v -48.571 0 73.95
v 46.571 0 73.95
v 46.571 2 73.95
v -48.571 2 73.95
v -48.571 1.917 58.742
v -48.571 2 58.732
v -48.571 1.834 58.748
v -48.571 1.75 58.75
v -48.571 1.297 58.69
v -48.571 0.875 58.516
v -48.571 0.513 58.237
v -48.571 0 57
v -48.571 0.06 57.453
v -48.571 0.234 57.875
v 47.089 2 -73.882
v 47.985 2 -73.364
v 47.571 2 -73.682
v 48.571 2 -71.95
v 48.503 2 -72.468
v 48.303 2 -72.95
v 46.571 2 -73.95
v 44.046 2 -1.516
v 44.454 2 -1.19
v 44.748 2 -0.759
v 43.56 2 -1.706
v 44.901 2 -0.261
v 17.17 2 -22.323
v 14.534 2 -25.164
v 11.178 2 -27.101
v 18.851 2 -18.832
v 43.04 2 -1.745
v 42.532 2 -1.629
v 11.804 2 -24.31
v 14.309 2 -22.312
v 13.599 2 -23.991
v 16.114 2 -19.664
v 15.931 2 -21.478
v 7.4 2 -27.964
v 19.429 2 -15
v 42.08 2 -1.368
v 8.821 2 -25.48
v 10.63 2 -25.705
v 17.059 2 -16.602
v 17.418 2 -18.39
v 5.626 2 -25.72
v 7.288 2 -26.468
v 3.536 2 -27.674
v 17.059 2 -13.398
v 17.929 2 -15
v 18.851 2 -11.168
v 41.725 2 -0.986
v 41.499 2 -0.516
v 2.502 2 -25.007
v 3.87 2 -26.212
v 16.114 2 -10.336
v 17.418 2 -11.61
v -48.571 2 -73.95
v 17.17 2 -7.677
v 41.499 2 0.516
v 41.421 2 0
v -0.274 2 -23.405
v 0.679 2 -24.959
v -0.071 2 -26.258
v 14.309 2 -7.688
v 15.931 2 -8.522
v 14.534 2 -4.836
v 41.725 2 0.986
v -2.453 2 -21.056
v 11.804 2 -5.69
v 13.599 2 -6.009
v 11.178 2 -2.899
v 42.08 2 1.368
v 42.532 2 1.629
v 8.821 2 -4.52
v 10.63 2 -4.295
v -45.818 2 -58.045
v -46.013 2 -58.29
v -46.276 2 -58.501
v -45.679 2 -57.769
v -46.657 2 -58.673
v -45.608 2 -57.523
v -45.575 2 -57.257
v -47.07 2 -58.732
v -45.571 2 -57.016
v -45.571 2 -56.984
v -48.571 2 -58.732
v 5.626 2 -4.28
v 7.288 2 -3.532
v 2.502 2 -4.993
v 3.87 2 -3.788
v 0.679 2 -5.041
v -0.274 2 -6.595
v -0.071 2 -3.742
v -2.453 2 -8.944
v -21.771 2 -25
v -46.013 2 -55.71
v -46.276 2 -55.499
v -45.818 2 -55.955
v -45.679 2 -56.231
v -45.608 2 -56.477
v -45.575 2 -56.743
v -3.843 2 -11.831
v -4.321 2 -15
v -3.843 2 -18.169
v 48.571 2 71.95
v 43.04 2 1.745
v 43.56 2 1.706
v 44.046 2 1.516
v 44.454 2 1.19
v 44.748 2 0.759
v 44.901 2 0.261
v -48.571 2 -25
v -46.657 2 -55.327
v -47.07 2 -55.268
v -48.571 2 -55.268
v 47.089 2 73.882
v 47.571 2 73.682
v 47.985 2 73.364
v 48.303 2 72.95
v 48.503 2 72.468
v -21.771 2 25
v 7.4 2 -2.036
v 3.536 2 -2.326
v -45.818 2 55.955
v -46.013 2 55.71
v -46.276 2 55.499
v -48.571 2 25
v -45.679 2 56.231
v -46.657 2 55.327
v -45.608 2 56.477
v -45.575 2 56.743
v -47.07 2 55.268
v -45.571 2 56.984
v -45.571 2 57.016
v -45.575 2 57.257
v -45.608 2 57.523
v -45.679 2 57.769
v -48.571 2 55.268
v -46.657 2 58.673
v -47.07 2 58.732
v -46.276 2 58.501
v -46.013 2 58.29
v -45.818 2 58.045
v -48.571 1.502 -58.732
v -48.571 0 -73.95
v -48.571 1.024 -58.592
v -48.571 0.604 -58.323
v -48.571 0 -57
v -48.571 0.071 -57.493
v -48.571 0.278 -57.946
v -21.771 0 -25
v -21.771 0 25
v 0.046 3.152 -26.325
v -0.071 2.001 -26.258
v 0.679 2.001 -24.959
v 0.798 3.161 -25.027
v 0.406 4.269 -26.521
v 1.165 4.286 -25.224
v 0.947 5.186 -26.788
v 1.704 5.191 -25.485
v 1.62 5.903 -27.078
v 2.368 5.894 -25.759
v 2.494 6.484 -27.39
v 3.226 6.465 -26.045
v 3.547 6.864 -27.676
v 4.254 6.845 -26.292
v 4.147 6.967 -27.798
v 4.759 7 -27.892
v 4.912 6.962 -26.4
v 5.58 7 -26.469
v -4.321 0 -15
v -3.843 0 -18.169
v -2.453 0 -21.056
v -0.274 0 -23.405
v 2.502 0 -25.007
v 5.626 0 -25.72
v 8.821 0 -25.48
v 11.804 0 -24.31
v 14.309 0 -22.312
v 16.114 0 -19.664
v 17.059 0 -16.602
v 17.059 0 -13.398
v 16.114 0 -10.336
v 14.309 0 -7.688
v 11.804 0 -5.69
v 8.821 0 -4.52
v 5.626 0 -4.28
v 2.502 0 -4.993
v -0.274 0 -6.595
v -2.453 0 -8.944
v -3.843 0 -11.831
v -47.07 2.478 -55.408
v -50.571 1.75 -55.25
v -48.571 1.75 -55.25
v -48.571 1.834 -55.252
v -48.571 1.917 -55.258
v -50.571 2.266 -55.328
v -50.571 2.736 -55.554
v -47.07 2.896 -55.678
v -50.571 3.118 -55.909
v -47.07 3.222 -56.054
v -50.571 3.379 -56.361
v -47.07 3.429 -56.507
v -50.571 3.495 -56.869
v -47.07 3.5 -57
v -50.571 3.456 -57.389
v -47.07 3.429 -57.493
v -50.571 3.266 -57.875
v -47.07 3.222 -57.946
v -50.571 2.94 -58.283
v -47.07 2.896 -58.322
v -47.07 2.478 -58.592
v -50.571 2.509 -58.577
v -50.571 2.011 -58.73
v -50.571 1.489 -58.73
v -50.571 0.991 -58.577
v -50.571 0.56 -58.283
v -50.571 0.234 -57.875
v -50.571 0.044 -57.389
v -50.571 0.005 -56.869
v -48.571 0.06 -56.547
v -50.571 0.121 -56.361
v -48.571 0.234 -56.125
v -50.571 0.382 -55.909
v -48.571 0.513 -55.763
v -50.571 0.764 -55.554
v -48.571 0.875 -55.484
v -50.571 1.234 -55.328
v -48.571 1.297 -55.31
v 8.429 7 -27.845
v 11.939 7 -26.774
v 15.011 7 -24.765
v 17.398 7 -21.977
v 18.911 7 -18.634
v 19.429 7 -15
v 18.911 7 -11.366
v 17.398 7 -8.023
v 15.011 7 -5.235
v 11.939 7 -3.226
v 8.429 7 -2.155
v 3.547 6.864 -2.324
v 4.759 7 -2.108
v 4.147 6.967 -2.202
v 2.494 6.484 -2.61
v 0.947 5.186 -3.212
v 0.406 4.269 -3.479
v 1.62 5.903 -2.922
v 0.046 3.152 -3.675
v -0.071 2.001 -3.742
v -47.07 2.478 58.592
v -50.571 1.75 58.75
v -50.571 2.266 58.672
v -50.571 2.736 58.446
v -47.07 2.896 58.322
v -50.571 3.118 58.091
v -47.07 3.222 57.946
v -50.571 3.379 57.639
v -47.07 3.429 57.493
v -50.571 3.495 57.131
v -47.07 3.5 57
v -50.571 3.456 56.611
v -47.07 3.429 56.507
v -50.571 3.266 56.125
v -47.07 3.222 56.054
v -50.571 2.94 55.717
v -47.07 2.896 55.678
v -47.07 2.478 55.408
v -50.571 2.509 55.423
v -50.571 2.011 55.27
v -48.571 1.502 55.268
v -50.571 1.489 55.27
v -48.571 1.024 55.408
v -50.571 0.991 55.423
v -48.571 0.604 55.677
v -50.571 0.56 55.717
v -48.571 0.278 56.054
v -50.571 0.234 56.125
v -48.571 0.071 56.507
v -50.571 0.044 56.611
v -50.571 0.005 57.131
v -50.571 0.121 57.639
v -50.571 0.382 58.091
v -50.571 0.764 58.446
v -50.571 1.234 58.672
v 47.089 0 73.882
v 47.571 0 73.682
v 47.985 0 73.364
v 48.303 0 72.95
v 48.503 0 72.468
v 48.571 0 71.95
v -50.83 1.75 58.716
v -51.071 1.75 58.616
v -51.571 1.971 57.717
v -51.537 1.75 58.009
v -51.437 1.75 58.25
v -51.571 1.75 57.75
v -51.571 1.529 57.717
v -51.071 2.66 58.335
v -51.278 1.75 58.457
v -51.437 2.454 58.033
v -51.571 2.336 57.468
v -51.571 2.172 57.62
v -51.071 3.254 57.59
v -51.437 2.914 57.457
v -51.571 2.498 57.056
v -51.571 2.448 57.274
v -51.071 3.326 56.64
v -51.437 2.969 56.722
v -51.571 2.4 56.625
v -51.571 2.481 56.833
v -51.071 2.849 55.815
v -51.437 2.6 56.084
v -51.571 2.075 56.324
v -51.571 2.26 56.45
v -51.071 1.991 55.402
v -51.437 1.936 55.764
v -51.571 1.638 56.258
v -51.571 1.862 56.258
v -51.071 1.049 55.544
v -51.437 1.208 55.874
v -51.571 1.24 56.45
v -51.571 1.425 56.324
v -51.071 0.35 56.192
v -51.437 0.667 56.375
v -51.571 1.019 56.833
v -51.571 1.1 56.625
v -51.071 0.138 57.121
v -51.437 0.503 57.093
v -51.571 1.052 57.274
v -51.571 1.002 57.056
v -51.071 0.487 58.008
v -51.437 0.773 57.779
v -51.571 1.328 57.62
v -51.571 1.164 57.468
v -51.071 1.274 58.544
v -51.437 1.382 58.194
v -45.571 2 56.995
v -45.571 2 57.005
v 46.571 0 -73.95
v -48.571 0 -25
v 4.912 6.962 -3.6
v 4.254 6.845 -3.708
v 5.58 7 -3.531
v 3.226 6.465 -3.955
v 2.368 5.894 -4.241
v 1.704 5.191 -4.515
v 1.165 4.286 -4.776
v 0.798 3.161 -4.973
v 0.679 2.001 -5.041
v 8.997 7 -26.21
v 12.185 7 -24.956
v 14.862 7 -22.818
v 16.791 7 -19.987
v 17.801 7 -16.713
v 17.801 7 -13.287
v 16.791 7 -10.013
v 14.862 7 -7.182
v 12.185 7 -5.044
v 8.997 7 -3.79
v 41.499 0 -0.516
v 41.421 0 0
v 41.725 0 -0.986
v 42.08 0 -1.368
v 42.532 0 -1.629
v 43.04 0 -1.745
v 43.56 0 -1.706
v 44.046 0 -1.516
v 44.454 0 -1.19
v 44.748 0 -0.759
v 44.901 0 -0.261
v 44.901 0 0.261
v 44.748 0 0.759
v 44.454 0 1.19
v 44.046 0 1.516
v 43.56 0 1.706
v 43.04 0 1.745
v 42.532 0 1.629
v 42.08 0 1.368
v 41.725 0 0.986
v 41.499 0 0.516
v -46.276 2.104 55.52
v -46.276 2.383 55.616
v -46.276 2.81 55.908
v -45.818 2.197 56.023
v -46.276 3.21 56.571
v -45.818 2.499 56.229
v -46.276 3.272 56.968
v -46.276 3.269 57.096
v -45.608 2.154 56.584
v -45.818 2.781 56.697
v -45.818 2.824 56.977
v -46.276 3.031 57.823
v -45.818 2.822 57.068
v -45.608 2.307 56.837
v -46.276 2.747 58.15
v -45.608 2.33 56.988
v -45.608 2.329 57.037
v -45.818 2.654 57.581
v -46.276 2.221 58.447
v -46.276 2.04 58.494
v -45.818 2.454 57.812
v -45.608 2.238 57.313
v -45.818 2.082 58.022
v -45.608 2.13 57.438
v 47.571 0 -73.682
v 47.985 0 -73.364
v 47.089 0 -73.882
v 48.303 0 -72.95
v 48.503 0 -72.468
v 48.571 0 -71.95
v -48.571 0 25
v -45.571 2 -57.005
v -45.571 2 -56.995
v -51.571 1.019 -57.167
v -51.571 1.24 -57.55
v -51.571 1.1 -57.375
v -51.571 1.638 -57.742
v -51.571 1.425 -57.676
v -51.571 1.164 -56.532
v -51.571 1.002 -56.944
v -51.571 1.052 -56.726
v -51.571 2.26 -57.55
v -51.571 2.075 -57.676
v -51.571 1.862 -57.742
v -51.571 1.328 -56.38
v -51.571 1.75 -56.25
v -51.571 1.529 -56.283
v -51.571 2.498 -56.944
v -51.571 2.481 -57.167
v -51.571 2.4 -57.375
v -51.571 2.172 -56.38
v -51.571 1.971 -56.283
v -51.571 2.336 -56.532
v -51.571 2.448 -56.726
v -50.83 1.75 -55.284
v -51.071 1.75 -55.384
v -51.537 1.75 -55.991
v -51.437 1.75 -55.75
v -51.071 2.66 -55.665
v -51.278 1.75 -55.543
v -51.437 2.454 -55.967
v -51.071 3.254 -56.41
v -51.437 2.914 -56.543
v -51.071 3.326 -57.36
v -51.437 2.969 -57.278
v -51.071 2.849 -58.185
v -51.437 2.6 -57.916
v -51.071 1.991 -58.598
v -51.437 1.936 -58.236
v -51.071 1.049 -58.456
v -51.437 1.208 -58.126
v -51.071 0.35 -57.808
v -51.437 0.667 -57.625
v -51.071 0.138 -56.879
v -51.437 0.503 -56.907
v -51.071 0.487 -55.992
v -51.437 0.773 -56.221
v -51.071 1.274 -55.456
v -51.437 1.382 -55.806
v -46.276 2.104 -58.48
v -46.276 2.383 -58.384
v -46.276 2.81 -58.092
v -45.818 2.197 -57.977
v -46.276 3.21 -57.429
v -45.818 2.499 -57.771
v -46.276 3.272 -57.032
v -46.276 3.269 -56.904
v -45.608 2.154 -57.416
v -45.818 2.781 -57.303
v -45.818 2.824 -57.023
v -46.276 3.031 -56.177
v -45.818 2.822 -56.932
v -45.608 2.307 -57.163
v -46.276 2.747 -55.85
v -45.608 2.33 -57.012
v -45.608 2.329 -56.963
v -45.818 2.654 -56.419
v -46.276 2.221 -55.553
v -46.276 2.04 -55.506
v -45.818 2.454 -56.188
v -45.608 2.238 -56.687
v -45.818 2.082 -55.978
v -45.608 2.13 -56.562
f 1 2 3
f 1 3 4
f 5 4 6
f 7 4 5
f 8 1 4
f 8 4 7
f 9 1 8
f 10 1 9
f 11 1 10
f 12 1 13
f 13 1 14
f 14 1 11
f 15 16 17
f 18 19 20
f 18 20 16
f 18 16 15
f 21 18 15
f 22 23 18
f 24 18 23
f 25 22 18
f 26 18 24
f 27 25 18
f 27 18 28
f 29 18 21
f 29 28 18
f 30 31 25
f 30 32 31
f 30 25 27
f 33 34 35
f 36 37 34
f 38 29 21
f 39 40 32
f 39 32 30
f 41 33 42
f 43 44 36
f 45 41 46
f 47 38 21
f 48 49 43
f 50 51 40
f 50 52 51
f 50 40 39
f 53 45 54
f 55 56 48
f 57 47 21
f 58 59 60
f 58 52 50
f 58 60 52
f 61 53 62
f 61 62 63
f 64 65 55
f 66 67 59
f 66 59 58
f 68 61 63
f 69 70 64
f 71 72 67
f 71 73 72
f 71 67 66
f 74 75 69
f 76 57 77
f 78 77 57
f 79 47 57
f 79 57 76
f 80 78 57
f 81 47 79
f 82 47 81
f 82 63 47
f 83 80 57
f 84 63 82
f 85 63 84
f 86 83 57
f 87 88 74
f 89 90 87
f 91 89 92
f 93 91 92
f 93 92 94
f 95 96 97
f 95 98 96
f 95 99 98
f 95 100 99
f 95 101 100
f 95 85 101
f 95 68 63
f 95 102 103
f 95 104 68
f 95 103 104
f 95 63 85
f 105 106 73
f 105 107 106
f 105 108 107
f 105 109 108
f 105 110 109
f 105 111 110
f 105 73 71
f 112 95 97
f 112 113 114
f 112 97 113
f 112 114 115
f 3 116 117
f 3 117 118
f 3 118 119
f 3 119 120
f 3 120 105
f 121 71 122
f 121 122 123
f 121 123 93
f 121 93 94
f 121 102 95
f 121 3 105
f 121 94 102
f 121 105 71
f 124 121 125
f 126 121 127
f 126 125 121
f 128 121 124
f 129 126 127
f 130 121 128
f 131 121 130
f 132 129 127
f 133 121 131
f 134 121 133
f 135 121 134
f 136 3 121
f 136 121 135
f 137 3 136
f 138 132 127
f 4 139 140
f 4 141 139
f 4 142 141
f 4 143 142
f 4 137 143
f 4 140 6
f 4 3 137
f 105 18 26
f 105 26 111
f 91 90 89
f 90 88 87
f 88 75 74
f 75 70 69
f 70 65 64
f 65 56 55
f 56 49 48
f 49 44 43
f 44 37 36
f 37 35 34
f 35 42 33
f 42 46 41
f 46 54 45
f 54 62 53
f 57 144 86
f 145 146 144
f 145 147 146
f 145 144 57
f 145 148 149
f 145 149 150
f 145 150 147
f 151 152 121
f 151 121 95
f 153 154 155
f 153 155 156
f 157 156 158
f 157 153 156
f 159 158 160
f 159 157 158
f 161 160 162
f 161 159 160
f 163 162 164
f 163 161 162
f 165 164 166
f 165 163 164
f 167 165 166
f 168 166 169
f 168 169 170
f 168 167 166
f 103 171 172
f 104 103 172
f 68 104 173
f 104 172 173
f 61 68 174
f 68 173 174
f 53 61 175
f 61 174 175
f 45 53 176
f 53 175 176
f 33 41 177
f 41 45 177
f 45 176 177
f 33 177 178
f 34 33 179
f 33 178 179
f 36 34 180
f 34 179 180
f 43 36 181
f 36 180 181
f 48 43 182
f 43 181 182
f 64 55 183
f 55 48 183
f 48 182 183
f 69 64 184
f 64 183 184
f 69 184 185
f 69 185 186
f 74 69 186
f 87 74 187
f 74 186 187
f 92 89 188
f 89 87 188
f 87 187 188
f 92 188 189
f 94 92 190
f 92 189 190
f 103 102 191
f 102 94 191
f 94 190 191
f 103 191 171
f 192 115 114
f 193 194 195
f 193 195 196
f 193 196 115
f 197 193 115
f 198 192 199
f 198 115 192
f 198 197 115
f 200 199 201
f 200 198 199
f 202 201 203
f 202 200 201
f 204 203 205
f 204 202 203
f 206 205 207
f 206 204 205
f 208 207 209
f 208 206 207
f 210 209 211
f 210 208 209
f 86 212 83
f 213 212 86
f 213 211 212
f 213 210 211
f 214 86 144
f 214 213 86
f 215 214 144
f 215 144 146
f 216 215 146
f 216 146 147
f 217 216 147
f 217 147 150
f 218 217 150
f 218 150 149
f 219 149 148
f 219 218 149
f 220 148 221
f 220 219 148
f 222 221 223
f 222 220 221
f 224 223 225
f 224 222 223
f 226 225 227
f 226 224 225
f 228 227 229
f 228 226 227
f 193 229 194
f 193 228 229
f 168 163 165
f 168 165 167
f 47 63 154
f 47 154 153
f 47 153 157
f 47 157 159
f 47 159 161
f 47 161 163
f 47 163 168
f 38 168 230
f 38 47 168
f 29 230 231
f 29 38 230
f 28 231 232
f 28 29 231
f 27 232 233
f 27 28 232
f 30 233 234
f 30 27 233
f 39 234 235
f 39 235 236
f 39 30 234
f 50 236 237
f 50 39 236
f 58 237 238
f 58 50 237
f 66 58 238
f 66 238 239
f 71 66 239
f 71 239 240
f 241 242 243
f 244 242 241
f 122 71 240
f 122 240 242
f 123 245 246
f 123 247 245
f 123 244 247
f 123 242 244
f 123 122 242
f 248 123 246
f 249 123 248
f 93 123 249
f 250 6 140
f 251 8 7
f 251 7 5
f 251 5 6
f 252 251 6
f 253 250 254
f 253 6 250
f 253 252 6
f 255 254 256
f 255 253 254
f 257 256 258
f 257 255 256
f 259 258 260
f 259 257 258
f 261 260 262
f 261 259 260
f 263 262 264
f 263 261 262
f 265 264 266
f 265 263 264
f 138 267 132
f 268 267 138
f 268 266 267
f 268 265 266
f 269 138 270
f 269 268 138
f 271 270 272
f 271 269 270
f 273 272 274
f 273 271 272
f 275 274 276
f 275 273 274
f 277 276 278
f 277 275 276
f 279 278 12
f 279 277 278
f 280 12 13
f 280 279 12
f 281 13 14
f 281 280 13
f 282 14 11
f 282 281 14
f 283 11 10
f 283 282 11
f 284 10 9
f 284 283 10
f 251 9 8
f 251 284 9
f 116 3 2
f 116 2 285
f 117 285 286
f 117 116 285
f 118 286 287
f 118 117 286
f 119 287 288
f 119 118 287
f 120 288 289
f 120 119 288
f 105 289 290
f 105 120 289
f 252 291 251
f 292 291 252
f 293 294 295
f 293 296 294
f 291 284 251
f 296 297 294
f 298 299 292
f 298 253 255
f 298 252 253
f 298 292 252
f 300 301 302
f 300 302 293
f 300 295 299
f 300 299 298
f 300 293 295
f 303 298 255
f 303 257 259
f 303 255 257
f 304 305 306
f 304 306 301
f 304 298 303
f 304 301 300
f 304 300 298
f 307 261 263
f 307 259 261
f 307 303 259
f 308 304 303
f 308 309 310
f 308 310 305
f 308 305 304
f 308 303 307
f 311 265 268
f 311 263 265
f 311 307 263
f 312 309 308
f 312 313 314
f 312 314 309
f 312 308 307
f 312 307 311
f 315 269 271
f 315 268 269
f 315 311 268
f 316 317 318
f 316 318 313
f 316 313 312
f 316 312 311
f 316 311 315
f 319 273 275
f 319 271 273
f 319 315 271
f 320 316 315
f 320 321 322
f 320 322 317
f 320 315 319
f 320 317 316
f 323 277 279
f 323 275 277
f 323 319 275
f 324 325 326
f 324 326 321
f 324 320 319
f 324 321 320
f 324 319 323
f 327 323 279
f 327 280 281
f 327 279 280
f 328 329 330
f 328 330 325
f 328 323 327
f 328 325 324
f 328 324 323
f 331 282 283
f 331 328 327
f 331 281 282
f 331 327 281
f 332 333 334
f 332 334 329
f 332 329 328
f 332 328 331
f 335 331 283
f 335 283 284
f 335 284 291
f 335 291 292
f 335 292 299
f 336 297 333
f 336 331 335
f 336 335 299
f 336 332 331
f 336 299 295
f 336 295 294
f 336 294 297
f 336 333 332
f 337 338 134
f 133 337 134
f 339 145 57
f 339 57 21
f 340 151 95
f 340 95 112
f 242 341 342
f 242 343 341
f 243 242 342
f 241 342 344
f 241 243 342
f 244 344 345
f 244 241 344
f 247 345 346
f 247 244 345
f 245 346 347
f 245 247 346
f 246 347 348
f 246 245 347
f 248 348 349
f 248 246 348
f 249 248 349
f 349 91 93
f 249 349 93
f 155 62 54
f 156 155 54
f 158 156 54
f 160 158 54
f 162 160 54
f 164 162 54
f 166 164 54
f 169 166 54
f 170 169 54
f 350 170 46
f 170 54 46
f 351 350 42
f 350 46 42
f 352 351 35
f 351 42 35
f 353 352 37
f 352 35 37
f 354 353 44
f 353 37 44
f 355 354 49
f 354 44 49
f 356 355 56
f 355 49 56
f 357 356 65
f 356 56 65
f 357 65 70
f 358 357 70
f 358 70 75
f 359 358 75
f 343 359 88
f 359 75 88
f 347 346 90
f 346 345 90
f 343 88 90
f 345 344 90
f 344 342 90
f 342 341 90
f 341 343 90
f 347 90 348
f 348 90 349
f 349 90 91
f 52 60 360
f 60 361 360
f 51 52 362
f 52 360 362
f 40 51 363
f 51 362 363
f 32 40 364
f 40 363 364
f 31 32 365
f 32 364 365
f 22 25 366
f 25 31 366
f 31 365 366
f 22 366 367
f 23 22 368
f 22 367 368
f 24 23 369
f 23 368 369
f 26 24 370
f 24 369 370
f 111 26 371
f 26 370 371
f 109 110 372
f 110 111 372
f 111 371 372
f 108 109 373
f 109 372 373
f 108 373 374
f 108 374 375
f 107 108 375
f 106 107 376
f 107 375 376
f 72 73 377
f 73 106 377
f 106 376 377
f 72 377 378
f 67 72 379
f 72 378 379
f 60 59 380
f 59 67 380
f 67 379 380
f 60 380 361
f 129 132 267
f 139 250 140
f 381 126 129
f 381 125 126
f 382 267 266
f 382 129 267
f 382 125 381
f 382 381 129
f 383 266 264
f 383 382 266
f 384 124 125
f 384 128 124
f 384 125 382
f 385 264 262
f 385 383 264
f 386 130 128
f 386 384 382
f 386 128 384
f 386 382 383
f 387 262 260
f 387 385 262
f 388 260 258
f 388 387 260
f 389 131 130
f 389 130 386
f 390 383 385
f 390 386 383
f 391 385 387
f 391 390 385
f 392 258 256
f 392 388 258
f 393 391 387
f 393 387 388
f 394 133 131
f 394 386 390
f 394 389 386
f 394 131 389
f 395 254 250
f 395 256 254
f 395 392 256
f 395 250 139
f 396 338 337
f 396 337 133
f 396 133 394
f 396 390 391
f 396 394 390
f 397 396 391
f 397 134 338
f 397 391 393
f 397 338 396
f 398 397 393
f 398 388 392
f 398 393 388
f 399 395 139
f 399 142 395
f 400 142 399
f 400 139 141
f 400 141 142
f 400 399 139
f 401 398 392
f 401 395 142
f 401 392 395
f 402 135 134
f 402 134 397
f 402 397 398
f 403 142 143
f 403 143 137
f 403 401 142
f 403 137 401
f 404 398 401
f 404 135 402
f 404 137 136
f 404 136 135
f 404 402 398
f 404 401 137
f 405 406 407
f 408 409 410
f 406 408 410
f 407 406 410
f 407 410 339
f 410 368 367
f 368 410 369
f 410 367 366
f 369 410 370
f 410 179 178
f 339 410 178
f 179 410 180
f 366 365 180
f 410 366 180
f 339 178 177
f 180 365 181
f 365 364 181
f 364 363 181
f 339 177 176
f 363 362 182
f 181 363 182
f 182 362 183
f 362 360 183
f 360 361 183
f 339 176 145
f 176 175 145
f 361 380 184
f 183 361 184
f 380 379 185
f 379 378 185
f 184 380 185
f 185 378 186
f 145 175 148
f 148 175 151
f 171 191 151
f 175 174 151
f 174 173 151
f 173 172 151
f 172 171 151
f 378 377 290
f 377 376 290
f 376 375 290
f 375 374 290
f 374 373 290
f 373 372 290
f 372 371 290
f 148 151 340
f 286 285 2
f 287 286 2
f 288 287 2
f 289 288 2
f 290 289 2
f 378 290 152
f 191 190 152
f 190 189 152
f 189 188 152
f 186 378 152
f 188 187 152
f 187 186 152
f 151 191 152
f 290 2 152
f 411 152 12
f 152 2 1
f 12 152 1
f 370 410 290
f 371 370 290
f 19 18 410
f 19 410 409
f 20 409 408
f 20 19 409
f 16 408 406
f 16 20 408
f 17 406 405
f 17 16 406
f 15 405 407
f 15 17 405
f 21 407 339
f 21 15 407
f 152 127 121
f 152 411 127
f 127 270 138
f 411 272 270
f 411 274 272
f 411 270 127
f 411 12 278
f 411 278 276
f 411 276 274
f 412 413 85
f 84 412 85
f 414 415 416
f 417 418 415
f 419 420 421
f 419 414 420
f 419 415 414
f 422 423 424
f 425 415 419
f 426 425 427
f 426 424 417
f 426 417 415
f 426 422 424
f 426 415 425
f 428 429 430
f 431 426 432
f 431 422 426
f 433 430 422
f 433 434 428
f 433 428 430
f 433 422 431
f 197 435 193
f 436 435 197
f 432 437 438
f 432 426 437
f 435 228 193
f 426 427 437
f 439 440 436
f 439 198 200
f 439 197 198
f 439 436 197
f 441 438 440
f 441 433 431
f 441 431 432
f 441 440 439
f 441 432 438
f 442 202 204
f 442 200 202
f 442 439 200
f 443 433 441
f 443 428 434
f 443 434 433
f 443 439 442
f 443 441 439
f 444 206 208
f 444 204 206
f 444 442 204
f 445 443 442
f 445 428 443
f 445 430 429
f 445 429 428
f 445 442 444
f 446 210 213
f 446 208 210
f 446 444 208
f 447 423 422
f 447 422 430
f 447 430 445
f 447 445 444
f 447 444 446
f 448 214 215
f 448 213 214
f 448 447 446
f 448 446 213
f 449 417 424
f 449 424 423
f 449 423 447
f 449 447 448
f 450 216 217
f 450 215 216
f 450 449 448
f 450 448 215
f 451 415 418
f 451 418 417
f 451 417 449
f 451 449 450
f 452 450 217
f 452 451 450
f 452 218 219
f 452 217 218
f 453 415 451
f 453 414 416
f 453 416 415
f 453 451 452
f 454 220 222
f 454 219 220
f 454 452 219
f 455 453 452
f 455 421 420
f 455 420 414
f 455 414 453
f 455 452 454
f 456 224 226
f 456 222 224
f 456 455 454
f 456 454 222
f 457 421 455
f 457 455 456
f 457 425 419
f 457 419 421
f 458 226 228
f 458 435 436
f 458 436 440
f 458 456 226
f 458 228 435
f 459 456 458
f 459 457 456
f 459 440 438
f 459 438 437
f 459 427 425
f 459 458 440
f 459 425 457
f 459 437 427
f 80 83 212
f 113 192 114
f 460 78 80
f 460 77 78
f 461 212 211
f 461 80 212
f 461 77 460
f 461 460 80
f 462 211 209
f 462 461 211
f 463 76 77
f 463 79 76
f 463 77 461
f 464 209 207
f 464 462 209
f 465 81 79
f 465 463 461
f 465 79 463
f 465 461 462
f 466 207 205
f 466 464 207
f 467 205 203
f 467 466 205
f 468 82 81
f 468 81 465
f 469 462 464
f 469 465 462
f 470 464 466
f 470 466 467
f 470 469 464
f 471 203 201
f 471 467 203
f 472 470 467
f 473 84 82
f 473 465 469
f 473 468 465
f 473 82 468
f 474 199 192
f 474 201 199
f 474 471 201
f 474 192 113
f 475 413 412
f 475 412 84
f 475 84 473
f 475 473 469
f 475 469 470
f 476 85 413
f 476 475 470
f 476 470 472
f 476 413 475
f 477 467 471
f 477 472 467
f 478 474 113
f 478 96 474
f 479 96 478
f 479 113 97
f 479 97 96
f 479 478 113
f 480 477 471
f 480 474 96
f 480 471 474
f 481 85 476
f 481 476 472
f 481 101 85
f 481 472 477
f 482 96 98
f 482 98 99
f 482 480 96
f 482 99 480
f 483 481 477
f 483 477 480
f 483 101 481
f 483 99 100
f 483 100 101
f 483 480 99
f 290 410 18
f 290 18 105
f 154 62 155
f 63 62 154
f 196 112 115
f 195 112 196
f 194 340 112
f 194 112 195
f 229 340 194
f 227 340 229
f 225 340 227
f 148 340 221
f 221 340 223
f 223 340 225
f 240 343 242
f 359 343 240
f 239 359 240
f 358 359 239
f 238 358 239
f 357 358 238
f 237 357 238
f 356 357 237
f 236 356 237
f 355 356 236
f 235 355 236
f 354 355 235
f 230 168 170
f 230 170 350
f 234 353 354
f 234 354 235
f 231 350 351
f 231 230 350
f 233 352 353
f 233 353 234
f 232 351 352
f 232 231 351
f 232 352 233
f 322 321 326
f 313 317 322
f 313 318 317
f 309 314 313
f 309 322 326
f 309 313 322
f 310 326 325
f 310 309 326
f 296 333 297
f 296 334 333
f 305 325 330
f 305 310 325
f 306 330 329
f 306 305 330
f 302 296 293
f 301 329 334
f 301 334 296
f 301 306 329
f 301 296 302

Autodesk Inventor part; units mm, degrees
ref_plane "YZ Plane" through (0, 0, 0) normal (1, 0, 0) x (0, 1, 0)
ref_plane "XZ Plane" through (0, 0, 0) normal (0, 1, 0) x (-1, 0, 0)
ref_plane "XY Plane" through (0, 0, 0) normal (0, 0, 1) x (1, 0, 0)
sketch "Sketch1" plane through (0, 0, 0) normal (0, 1, 0) x (-1, 0, 0)
  line L0 (-48.571, 73.95) -> (48.571, 73.95)
  line L1 (48.571, 73.95) -> (48.571, -73.95)
  line L2 (48.571, -73.95) -> (-48.571, -73.95)
  line L3 (-48.571, -73.95) -> (-48.571, 73.95)
  line L4 (-48.571, 73.95) -> (48.571, -73.95) construction
  line L5 (48.571, 73.95) -> (-48.571, -73.95) construction
  circle A0 centre (-43.171, 0) radius 1.75
  line L6 (-48.571, -73.95) -> (-48.571, -59.45)
  circle A1 centre (-6.429, -15) radius 10.75
  line L7 (-67.9994, 0) -> (67.9994, 0) construction
  point P0 (0, 0)
  dimension "d0" = 97.142
  dimension "d1" = 147.9
  dimension "d3" = 3.5
  dimension "d54" = 55
  dimension "d61" = 5.4
  dimension "d62" = 15
  dimension "d63" = 21.5
extrude "Lid Shape" add sketch "Sketch1" along normal blind 2
sketch "Sketch2" plane through (0, 2, 0) normal (0, 1, 0) x (1, 0, 0)
  circle A0 centre (6.429, 15) radius 10.75
  circle A1 centre (6.429, 15) radius 11.5
  circle A2 centre (6.429, 15) radius 13
  line L0 (6.429, 15) -> (-0.071, 3.7417)
  line L1 (6.429, 15) -> (19.429, 15) construction
  line L2 (6.429, 15) -> (-0.071, 26.2583)
  circle A3 centre (6.429, 15) radius 10.75 construction
  point P0 (0.679, 24.9593)
  point P1 (0.679, 5.0407)
  dimension "d64" = 26
  dimension "d65" = 23
  dimension "d66" = 120
  dimension "d67" = 120
extrude "Switch Protector" add sketch "Sketch2" along normal blind 5 contours L2 A2 L0 A1 picked at (18.7089, 13.1166)
fillet "Fillet1" radius 5 2 edges at (0.304, 7, -4.3912) (0.304, 7, -25.6088)
fillet "Fillet2" radius 2 2 edges at (48.571, 1, 73.95) (48.571, 1, -73.95)
sketch "Sketch4" plane through (-48.571, 0, -73.95) normal (-1, 0, 0) x (0, 0, 1)
  line L0 (16.95, 0) -> (16.95, 1.75) construction
  circle A0 centre (16.95, 1.75) radius 1.75
  circle A1 centre (73.95, 1.75) radius 1.75
  circle A2 centre (130.95, 1.75) radius 1.75
  line L1 (0, 2) -> (147.9, 2) projected
  line L2 (0, 0) -> (147.9, 0) projected
  line L3 (147.9, 0) -> (147.9, 2) projected
  line L4 (0, 2) -> (147.9, 2) projected
  line L5 (0, 0) -> (0, 2) projected
  line L6 (73.95, 4.2) -> (73.95, -0.7) construction
  point P0 (73.95, 0)
  dimension "d68" = 3.5
  dimension "d69" = 57
  dimension "d70" = 57
extrude "Peg Connectors" add sketch "Sketch4" along normal blind 3 and the other way blind 3 contours A0 L1 | L1 A0 | L1 A1 | A1 L1 | A2 L1 | A2 L1
fillet "Fillet5" radius 1.5 3 edges at (-45.571, 3.5, 57) (-45.571, 3.5, 0) (-45.571, 3.5, -57)
fillet "Fillet6" radius 1 3 edges at (-51.571, 1.75, 55.25) (-51.571, 1.75, -1.75) (-51.571, 1.75, -58.75)
sketch "Sketch7" plane through (0, 2, 0) normal (0, 1, 0) x (1, 0, 0)
  line L0 (-21.771, -25) -> (-21.771, 25)
  line L1 (-21.771, 25) -> (-55.771, 25)
  line L2 (-55.771, 25) -> (-55.771, -25)
  line L3 (-55.771, -25) -> (-21.771, -25)
  line L4 (-48.571, -1.7321) -> (-48.571, -55.2679) construction
  line L5 (-76.6394, 0) -> (69.4394, 0) construction
  point P0 (0, 0)
  dimension "d60" = 50
  dimension "d71" = 34
  dimension "d72" = 26.8
extrude "Weapon Hole" cut sketch "Sketch7" along normal mid plane 6.7625
properties part number "Base Shell Top V3"
